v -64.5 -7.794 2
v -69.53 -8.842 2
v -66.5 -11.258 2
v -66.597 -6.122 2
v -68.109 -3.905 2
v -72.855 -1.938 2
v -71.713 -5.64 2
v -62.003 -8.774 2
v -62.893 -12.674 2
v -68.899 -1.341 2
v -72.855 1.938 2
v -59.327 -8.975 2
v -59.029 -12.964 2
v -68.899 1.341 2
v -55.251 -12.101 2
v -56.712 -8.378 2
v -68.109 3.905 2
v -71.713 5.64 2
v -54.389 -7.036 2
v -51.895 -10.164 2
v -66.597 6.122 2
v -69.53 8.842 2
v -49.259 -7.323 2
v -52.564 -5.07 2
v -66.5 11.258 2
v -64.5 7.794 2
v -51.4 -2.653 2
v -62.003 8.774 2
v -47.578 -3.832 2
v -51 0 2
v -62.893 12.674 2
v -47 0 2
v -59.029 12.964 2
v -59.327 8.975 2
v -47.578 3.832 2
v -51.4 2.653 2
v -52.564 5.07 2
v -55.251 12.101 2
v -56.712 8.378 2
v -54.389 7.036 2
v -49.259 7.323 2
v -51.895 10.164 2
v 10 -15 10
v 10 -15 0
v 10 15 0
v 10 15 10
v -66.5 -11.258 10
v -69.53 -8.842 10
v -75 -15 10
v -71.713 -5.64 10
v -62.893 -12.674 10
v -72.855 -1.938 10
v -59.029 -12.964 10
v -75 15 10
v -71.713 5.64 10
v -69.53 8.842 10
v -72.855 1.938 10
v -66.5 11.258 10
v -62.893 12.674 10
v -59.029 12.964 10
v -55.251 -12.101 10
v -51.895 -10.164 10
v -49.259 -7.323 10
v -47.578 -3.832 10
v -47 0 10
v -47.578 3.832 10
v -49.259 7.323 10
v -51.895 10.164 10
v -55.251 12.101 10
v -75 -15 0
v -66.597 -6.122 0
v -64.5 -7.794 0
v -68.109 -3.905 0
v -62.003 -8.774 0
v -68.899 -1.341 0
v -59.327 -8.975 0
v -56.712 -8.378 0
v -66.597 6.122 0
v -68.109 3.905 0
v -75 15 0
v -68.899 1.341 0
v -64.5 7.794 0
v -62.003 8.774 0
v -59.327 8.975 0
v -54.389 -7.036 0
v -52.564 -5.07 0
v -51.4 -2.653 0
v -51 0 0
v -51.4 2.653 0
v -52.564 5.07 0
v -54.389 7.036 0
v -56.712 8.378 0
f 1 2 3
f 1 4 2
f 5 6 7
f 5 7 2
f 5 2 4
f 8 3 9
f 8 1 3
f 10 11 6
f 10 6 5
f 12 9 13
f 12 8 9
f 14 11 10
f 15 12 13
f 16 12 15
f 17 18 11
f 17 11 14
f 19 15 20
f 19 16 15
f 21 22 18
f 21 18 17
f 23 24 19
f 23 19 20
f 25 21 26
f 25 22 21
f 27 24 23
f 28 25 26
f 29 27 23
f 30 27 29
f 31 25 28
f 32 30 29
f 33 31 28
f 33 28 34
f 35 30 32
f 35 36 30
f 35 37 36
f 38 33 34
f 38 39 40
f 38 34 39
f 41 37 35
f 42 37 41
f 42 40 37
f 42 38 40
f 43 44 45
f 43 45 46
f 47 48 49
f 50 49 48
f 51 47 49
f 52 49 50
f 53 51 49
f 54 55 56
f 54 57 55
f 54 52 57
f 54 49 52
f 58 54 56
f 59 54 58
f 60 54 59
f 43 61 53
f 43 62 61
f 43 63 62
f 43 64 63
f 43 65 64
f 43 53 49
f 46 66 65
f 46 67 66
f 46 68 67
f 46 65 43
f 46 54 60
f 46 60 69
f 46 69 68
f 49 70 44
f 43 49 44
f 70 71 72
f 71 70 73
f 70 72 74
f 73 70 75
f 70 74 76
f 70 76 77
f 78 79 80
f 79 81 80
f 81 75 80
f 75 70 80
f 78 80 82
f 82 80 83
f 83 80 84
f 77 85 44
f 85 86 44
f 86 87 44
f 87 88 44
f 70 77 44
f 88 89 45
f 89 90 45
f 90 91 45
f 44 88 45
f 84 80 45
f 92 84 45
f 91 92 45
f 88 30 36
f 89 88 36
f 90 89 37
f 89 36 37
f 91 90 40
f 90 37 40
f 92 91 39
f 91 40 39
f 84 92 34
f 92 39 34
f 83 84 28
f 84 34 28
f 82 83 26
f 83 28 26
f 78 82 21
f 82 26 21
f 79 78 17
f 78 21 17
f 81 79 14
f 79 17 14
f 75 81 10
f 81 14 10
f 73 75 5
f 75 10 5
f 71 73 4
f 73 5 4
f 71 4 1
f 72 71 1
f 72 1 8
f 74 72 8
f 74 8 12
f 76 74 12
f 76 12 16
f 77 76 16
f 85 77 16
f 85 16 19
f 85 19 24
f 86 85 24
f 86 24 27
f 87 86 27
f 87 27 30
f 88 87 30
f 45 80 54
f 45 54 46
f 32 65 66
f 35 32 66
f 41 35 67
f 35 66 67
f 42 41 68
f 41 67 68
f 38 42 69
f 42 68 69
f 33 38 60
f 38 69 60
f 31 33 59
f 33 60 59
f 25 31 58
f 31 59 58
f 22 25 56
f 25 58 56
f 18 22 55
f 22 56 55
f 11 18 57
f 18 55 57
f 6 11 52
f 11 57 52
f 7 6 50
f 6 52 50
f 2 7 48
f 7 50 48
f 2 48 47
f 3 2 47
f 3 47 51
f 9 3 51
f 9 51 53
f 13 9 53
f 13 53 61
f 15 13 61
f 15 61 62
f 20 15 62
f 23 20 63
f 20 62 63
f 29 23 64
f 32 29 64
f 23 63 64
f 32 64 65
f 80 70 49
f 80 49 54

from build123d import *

# Parameters (mm, degrees)
ESBO_O1_W                = 150
ESBO_O1_H                = 30
RESSALTO_EXTRUS_O1_DEPTH = 10
ESBO_O2_R                = 13
CORTE_EXTRUS_O1_DEPTH    = 8
CORTE_EXTRUS_O2_REACH    = 78.903
ESBO_O3_R                = 9
CORTE_EXTRUS_O3_REACH    = 83.394
ESBO_O4_W                = 65
ESBO_O4_H                = 10


with BuildPart() as part:
    # Esboço1 → Ressalto-extrusão1 (new body)
    with BuildSketch(Plane.XY):
        Rectangle(ESBO_O1_W, ESBO_O1_H)
    extrude(amount=RESSALTO_EXTRUS_O1_DEPTH)

    # Esboço2 → Corte-extrusão1 (cut)
    with BuildSketch(Plane.XY.offset(10)):
        with Locations((-60, 0)):
            Circle(ESBO_O2_R)
    extrude(amount=-CORTE_EXTRUS_O1_DEPTH, mode=Mode.SUBTRACT)

    # Esboço3 → Corte-extrusão2 (cut, up to next)
    with BuildSketch(Plane.XY.offset(2), mode=Mode.PRIVATE) as corte_extrus_o2_sk1:
        with Locations((-60, 0)):
            Circle(ESBO_O3_R)
    corte_extrus_o2_tool1 = extrude(corte_extrus_o2_sk1.sketch, amount=-CORTE_EXTRUS_O2_REACH, mode=Mode.PRIVATE) & part.part
    add(corte_extrus_o2_tool1.solids().sort_by_distance((-60, 0, 2))[0], mode=Mode.SUBTRACT)

    # Esboço4 → Corte-extrusão3 (cut, up to next)
    with BuildSketch(Plane.XZ.offset(15), mode=Mode.PRIVATE) as corte_extrus_o3_sk1:
        with Locations((42.5, 5)):
            Rectangle(ESBO_O4_W, ESBO_O4_H)
    corte_extrus_o3_tool1 = extrude(corte_extrus_o3_sk1.sketch, amount=-CORTE_EXTRUS_O3_REACH, mode=Mode.PRIVATE) & part.part
    add(corte_extrus_o3_tool1.solids().sort_by_distance((42.5, -15, 5))[0], mode=Mode.SUBTRACT)


solid = part.part
